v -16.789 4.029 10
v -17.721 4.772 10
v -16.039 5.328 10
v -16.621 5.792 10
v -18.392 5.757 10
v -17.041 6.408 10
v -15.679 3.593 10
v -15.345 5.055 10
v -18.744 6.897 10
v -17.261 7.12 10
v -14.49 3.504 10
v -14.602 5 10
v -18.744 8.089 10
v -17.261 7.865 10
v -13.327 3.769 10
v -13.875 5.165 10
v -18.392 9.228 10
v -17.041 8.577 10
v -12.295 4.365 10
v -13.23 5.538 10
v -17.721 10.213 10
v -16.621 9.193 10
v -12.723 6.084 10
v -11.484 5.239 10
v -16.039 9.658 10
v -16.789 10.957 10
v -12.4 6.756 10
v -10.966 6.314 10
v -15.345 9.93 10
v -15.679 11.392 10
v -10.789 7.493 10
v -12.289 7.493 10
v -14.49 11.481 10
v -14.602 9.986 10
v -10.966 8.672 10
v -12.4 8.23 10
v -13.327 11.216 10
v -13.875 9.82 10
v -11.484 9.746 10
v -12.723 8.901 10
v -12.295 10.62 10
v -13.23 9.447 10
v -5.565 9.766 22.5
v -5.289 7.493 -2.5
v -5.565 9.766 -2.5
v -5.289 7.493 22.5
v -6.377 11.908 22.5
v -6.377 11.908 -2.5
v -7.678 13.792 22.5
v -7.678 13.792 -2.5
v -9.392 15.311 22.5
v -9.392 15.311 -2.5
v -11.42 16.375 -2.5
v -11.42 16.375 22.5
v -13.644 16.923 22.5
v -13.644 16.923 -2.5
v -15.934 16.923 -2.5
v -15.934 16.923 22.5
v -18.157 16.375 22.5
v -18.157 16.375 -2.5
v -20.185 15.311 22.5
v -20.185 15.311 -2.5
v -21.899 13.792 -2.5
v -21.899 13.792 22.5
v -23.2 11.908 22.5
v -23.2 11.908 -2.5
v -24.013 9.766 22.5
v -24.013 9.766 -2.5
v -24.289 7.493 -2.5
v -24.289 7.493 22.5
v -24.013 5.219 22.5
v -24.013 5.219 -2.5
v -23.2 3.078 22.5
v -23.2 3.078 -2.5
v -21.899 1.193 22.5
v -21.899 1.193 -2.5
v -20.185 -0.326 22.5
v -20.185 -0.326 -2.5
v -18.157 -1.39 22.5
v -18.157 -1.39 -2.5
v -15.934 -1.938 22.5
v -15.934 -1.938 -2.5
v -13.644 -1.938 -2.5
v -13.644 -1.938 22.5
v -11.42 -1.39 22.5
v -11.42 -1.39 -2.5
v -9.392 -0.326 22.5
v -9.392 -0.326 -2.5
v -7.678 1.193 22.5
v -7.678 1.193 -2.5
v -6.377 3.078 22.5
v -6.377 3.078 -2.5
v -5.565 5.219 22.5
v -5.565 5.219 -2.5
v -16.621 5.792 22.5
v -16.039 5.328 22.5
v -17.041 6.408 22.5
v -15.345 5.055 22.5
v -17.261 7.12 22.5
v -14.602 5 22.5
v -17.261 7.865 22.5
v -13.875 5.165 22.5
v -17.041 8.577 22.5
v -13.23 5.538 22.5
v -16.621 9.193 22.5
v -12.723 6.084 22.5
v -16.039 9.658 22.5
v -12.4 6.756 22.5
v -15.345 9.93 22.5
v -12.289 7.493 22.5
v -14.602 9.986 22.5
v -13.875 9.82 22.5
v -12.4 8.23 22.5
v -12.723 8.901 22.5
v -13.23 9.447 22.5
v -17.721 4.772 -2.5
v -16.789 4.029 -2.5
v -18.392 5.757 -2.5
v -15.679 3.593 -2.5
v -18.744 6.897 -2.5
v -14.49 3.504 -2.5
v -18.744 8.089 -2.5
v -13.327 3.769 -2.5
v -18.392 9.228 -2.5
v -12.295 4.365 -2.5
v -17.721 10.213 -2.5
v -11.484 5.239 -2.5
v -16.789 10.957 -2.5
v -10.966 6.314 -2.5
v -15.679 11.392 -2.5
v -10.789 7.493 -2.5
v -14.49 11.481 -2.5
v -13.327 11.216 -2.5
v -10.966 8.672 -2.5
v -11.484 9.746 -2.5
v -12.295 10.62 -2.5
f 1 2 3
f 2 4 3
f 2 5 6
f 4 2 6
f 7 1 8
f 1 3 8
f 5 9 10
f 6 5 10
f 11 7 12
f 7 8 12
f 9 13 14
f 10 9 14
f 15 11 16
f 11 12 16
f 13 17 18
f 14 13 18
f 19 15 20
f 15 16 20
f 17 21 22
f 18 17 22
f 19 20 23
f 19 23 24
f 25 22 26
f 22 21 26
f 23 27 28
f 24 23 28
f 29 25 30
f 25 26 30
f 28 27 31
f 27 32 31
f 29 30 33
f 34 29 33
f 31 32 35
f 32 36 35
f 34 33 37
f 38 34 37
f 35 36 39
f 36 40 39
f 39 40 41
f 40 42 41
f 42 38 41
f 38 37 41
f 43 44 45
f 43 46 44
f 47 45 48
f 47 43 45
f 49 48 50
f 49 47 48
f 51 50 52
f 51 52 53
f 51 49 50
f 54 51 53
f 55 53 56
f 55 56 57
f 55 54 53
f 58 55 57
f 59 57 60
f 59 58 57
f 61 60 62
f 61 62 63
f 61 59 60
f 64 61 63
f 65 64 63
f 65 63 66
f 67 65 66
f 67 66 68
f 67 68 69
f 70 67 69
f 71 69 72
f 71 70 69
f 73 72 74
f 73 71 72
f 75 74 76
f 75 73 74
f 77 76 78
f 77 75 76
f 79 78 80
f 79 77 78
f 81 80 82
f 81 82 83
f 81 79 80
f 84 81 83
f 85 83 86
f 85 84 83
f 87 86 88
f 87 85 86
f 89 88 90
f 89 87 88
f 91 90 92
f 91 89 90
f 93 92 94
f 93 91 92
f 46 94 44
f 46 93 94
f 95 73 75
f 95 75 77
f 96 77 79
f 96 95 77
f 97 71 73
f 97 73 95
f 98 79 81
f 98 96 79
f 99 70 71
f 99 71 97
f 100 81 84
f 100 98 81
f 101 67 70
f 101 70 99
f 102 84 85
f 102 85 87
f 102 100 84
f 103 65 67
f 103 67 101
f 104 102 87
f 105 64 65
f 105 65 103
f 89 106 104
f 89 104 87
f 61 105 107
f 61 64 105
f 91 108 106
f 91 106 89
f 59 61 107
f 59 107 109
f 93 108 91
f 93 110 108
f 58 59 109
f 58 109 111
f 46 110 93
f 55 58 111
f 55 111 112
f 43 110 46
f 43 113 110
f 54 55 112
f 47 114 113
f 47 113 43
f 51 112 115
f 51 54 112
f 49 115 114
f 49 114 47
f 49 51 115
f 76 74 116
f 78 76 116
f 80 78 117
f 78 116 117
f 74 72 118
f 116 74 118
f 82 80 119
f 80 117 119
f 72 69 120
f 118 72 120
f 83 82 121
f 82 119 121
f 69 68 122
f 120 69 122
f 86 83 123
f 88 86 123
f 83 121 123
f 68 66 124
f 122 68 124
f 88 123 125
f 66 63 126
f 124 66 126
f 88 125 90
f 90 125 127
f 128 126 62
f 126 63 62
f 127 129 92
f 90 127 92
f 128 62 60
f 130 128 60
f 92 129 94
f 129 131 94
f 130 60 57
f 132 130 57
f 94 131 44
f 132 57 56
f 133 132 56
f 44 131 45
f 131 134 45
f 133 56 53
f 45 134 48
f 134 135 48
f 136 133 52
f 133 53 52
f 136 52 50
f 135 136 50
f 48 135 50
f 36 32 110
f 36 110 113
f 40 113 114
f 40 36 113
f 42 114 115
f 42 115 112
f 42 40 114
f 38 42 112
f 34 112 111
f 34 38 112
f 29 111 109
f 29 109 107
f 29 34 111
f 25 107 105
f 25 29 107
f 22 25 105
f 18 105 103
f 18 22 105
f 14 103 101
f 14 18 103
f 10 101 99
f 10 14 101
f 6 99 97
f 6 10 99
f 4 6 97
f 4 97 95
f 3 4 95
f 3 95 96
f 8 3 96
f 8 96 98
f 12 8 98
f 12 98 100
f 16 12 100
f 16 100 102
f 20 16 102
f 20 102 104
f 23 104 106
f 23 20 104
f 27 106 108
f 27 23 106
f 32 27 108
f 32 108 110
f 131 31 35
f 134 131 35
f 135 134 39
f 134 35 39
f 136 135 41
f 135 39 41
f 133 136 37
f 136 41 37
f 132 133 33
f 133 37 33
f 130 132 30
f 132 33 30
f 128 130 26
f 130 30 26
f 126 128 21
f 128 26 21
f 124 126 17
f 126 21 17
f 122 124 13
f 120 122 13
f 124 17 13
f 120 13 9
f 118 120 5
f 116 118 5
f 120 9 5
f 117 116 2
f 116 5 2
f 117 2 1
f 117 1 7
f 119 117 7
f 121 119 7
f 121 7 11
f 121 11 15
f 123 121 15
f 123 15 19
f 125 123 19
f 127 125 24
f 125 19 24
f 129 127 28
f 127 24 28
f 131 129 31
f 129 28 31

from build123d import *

# Parameters (mm, degrees)
SKETCH_2_R           = 9.5
EXTRUDE_1_DEPTH      = 12.5
SKETCH_4_OUTSIDE_W   = 28.34
SKETCH_4_OUTSIDE_H   = 28.34
SKETCH_4_OUTSIDE_R   = 9.5
SKETCH_4_OUTSIDE_R_2 = 4
CUT_EXTRUDE_1_DEPTH  = 12.5
SKETCH_5_OUTSIDE_W   = 28.34
SKETCH_5_OUTSIDE_H   = 28.34
SKETCH_5_OUTSIDE_R   = 9.5
SKETCH_5_OUTSIDE_R_2 = 2.5
CUT_EXTRUDE_2_DEPTH  = 12.5


with BuildPart() as part:
    # 草图2 → 凸台-拉伸1 (new body, symmetric)
    with BuildSketch(Plane.XY.offset(10)):
        with Locations((-14.788619837, 7.492683074)):
            Circle(SKETCH_2_R)
    extrude(amount=EXTRUDE_1_DEPTH, both=True)

    # 草图4 outside → 切除-拉伸1 (cut)
    with BuildSketch(Plane.XY.offset(10)):
        with Locations((-14.789, 7.493)):
            Rectangle(SKETCH_4_OUTSIDE_W, SKETCH_4_OUTSIDE_H)
        with Locations((-14.788619837, 7.492683074)):
            Circle(SKETCH_4_OUTSIDE_R, mode=Mode.SUBTRACT)
        with Locations((-14.788619837, 7.492683074)):
            Circle(SKETCH_4_OUTSIDE_R_2)
    extrude(amount=-CUT_EXTRUDE_1_DEPTH, mode=Mode.SUBTRACT)

    # 草图5 outside → 切除-拉伸2 (cut)
    with BuildSketch(Plane.XY.offset(10)):
        with Locations((-14.789, 7.493)):
            Rectangle(SKETCH_5_OUTSIDE_W, SKETCH_5_OUTSIDE_H)
        with Locations((-14.788619837, 7.492683074)):
            Circle(SKETCH_5_OUTSIDE_R, mode=Mode.SUBTRACT)
        with Locations((-14.788619837, 7.492683074)):
            Circle(SKETCH_5_OUTSIDE_R_2)
    extrude(amount=CUT_EXTRUDE_2_DEPTH, mode=Mode.SUBTRACT)


solid = part.part
